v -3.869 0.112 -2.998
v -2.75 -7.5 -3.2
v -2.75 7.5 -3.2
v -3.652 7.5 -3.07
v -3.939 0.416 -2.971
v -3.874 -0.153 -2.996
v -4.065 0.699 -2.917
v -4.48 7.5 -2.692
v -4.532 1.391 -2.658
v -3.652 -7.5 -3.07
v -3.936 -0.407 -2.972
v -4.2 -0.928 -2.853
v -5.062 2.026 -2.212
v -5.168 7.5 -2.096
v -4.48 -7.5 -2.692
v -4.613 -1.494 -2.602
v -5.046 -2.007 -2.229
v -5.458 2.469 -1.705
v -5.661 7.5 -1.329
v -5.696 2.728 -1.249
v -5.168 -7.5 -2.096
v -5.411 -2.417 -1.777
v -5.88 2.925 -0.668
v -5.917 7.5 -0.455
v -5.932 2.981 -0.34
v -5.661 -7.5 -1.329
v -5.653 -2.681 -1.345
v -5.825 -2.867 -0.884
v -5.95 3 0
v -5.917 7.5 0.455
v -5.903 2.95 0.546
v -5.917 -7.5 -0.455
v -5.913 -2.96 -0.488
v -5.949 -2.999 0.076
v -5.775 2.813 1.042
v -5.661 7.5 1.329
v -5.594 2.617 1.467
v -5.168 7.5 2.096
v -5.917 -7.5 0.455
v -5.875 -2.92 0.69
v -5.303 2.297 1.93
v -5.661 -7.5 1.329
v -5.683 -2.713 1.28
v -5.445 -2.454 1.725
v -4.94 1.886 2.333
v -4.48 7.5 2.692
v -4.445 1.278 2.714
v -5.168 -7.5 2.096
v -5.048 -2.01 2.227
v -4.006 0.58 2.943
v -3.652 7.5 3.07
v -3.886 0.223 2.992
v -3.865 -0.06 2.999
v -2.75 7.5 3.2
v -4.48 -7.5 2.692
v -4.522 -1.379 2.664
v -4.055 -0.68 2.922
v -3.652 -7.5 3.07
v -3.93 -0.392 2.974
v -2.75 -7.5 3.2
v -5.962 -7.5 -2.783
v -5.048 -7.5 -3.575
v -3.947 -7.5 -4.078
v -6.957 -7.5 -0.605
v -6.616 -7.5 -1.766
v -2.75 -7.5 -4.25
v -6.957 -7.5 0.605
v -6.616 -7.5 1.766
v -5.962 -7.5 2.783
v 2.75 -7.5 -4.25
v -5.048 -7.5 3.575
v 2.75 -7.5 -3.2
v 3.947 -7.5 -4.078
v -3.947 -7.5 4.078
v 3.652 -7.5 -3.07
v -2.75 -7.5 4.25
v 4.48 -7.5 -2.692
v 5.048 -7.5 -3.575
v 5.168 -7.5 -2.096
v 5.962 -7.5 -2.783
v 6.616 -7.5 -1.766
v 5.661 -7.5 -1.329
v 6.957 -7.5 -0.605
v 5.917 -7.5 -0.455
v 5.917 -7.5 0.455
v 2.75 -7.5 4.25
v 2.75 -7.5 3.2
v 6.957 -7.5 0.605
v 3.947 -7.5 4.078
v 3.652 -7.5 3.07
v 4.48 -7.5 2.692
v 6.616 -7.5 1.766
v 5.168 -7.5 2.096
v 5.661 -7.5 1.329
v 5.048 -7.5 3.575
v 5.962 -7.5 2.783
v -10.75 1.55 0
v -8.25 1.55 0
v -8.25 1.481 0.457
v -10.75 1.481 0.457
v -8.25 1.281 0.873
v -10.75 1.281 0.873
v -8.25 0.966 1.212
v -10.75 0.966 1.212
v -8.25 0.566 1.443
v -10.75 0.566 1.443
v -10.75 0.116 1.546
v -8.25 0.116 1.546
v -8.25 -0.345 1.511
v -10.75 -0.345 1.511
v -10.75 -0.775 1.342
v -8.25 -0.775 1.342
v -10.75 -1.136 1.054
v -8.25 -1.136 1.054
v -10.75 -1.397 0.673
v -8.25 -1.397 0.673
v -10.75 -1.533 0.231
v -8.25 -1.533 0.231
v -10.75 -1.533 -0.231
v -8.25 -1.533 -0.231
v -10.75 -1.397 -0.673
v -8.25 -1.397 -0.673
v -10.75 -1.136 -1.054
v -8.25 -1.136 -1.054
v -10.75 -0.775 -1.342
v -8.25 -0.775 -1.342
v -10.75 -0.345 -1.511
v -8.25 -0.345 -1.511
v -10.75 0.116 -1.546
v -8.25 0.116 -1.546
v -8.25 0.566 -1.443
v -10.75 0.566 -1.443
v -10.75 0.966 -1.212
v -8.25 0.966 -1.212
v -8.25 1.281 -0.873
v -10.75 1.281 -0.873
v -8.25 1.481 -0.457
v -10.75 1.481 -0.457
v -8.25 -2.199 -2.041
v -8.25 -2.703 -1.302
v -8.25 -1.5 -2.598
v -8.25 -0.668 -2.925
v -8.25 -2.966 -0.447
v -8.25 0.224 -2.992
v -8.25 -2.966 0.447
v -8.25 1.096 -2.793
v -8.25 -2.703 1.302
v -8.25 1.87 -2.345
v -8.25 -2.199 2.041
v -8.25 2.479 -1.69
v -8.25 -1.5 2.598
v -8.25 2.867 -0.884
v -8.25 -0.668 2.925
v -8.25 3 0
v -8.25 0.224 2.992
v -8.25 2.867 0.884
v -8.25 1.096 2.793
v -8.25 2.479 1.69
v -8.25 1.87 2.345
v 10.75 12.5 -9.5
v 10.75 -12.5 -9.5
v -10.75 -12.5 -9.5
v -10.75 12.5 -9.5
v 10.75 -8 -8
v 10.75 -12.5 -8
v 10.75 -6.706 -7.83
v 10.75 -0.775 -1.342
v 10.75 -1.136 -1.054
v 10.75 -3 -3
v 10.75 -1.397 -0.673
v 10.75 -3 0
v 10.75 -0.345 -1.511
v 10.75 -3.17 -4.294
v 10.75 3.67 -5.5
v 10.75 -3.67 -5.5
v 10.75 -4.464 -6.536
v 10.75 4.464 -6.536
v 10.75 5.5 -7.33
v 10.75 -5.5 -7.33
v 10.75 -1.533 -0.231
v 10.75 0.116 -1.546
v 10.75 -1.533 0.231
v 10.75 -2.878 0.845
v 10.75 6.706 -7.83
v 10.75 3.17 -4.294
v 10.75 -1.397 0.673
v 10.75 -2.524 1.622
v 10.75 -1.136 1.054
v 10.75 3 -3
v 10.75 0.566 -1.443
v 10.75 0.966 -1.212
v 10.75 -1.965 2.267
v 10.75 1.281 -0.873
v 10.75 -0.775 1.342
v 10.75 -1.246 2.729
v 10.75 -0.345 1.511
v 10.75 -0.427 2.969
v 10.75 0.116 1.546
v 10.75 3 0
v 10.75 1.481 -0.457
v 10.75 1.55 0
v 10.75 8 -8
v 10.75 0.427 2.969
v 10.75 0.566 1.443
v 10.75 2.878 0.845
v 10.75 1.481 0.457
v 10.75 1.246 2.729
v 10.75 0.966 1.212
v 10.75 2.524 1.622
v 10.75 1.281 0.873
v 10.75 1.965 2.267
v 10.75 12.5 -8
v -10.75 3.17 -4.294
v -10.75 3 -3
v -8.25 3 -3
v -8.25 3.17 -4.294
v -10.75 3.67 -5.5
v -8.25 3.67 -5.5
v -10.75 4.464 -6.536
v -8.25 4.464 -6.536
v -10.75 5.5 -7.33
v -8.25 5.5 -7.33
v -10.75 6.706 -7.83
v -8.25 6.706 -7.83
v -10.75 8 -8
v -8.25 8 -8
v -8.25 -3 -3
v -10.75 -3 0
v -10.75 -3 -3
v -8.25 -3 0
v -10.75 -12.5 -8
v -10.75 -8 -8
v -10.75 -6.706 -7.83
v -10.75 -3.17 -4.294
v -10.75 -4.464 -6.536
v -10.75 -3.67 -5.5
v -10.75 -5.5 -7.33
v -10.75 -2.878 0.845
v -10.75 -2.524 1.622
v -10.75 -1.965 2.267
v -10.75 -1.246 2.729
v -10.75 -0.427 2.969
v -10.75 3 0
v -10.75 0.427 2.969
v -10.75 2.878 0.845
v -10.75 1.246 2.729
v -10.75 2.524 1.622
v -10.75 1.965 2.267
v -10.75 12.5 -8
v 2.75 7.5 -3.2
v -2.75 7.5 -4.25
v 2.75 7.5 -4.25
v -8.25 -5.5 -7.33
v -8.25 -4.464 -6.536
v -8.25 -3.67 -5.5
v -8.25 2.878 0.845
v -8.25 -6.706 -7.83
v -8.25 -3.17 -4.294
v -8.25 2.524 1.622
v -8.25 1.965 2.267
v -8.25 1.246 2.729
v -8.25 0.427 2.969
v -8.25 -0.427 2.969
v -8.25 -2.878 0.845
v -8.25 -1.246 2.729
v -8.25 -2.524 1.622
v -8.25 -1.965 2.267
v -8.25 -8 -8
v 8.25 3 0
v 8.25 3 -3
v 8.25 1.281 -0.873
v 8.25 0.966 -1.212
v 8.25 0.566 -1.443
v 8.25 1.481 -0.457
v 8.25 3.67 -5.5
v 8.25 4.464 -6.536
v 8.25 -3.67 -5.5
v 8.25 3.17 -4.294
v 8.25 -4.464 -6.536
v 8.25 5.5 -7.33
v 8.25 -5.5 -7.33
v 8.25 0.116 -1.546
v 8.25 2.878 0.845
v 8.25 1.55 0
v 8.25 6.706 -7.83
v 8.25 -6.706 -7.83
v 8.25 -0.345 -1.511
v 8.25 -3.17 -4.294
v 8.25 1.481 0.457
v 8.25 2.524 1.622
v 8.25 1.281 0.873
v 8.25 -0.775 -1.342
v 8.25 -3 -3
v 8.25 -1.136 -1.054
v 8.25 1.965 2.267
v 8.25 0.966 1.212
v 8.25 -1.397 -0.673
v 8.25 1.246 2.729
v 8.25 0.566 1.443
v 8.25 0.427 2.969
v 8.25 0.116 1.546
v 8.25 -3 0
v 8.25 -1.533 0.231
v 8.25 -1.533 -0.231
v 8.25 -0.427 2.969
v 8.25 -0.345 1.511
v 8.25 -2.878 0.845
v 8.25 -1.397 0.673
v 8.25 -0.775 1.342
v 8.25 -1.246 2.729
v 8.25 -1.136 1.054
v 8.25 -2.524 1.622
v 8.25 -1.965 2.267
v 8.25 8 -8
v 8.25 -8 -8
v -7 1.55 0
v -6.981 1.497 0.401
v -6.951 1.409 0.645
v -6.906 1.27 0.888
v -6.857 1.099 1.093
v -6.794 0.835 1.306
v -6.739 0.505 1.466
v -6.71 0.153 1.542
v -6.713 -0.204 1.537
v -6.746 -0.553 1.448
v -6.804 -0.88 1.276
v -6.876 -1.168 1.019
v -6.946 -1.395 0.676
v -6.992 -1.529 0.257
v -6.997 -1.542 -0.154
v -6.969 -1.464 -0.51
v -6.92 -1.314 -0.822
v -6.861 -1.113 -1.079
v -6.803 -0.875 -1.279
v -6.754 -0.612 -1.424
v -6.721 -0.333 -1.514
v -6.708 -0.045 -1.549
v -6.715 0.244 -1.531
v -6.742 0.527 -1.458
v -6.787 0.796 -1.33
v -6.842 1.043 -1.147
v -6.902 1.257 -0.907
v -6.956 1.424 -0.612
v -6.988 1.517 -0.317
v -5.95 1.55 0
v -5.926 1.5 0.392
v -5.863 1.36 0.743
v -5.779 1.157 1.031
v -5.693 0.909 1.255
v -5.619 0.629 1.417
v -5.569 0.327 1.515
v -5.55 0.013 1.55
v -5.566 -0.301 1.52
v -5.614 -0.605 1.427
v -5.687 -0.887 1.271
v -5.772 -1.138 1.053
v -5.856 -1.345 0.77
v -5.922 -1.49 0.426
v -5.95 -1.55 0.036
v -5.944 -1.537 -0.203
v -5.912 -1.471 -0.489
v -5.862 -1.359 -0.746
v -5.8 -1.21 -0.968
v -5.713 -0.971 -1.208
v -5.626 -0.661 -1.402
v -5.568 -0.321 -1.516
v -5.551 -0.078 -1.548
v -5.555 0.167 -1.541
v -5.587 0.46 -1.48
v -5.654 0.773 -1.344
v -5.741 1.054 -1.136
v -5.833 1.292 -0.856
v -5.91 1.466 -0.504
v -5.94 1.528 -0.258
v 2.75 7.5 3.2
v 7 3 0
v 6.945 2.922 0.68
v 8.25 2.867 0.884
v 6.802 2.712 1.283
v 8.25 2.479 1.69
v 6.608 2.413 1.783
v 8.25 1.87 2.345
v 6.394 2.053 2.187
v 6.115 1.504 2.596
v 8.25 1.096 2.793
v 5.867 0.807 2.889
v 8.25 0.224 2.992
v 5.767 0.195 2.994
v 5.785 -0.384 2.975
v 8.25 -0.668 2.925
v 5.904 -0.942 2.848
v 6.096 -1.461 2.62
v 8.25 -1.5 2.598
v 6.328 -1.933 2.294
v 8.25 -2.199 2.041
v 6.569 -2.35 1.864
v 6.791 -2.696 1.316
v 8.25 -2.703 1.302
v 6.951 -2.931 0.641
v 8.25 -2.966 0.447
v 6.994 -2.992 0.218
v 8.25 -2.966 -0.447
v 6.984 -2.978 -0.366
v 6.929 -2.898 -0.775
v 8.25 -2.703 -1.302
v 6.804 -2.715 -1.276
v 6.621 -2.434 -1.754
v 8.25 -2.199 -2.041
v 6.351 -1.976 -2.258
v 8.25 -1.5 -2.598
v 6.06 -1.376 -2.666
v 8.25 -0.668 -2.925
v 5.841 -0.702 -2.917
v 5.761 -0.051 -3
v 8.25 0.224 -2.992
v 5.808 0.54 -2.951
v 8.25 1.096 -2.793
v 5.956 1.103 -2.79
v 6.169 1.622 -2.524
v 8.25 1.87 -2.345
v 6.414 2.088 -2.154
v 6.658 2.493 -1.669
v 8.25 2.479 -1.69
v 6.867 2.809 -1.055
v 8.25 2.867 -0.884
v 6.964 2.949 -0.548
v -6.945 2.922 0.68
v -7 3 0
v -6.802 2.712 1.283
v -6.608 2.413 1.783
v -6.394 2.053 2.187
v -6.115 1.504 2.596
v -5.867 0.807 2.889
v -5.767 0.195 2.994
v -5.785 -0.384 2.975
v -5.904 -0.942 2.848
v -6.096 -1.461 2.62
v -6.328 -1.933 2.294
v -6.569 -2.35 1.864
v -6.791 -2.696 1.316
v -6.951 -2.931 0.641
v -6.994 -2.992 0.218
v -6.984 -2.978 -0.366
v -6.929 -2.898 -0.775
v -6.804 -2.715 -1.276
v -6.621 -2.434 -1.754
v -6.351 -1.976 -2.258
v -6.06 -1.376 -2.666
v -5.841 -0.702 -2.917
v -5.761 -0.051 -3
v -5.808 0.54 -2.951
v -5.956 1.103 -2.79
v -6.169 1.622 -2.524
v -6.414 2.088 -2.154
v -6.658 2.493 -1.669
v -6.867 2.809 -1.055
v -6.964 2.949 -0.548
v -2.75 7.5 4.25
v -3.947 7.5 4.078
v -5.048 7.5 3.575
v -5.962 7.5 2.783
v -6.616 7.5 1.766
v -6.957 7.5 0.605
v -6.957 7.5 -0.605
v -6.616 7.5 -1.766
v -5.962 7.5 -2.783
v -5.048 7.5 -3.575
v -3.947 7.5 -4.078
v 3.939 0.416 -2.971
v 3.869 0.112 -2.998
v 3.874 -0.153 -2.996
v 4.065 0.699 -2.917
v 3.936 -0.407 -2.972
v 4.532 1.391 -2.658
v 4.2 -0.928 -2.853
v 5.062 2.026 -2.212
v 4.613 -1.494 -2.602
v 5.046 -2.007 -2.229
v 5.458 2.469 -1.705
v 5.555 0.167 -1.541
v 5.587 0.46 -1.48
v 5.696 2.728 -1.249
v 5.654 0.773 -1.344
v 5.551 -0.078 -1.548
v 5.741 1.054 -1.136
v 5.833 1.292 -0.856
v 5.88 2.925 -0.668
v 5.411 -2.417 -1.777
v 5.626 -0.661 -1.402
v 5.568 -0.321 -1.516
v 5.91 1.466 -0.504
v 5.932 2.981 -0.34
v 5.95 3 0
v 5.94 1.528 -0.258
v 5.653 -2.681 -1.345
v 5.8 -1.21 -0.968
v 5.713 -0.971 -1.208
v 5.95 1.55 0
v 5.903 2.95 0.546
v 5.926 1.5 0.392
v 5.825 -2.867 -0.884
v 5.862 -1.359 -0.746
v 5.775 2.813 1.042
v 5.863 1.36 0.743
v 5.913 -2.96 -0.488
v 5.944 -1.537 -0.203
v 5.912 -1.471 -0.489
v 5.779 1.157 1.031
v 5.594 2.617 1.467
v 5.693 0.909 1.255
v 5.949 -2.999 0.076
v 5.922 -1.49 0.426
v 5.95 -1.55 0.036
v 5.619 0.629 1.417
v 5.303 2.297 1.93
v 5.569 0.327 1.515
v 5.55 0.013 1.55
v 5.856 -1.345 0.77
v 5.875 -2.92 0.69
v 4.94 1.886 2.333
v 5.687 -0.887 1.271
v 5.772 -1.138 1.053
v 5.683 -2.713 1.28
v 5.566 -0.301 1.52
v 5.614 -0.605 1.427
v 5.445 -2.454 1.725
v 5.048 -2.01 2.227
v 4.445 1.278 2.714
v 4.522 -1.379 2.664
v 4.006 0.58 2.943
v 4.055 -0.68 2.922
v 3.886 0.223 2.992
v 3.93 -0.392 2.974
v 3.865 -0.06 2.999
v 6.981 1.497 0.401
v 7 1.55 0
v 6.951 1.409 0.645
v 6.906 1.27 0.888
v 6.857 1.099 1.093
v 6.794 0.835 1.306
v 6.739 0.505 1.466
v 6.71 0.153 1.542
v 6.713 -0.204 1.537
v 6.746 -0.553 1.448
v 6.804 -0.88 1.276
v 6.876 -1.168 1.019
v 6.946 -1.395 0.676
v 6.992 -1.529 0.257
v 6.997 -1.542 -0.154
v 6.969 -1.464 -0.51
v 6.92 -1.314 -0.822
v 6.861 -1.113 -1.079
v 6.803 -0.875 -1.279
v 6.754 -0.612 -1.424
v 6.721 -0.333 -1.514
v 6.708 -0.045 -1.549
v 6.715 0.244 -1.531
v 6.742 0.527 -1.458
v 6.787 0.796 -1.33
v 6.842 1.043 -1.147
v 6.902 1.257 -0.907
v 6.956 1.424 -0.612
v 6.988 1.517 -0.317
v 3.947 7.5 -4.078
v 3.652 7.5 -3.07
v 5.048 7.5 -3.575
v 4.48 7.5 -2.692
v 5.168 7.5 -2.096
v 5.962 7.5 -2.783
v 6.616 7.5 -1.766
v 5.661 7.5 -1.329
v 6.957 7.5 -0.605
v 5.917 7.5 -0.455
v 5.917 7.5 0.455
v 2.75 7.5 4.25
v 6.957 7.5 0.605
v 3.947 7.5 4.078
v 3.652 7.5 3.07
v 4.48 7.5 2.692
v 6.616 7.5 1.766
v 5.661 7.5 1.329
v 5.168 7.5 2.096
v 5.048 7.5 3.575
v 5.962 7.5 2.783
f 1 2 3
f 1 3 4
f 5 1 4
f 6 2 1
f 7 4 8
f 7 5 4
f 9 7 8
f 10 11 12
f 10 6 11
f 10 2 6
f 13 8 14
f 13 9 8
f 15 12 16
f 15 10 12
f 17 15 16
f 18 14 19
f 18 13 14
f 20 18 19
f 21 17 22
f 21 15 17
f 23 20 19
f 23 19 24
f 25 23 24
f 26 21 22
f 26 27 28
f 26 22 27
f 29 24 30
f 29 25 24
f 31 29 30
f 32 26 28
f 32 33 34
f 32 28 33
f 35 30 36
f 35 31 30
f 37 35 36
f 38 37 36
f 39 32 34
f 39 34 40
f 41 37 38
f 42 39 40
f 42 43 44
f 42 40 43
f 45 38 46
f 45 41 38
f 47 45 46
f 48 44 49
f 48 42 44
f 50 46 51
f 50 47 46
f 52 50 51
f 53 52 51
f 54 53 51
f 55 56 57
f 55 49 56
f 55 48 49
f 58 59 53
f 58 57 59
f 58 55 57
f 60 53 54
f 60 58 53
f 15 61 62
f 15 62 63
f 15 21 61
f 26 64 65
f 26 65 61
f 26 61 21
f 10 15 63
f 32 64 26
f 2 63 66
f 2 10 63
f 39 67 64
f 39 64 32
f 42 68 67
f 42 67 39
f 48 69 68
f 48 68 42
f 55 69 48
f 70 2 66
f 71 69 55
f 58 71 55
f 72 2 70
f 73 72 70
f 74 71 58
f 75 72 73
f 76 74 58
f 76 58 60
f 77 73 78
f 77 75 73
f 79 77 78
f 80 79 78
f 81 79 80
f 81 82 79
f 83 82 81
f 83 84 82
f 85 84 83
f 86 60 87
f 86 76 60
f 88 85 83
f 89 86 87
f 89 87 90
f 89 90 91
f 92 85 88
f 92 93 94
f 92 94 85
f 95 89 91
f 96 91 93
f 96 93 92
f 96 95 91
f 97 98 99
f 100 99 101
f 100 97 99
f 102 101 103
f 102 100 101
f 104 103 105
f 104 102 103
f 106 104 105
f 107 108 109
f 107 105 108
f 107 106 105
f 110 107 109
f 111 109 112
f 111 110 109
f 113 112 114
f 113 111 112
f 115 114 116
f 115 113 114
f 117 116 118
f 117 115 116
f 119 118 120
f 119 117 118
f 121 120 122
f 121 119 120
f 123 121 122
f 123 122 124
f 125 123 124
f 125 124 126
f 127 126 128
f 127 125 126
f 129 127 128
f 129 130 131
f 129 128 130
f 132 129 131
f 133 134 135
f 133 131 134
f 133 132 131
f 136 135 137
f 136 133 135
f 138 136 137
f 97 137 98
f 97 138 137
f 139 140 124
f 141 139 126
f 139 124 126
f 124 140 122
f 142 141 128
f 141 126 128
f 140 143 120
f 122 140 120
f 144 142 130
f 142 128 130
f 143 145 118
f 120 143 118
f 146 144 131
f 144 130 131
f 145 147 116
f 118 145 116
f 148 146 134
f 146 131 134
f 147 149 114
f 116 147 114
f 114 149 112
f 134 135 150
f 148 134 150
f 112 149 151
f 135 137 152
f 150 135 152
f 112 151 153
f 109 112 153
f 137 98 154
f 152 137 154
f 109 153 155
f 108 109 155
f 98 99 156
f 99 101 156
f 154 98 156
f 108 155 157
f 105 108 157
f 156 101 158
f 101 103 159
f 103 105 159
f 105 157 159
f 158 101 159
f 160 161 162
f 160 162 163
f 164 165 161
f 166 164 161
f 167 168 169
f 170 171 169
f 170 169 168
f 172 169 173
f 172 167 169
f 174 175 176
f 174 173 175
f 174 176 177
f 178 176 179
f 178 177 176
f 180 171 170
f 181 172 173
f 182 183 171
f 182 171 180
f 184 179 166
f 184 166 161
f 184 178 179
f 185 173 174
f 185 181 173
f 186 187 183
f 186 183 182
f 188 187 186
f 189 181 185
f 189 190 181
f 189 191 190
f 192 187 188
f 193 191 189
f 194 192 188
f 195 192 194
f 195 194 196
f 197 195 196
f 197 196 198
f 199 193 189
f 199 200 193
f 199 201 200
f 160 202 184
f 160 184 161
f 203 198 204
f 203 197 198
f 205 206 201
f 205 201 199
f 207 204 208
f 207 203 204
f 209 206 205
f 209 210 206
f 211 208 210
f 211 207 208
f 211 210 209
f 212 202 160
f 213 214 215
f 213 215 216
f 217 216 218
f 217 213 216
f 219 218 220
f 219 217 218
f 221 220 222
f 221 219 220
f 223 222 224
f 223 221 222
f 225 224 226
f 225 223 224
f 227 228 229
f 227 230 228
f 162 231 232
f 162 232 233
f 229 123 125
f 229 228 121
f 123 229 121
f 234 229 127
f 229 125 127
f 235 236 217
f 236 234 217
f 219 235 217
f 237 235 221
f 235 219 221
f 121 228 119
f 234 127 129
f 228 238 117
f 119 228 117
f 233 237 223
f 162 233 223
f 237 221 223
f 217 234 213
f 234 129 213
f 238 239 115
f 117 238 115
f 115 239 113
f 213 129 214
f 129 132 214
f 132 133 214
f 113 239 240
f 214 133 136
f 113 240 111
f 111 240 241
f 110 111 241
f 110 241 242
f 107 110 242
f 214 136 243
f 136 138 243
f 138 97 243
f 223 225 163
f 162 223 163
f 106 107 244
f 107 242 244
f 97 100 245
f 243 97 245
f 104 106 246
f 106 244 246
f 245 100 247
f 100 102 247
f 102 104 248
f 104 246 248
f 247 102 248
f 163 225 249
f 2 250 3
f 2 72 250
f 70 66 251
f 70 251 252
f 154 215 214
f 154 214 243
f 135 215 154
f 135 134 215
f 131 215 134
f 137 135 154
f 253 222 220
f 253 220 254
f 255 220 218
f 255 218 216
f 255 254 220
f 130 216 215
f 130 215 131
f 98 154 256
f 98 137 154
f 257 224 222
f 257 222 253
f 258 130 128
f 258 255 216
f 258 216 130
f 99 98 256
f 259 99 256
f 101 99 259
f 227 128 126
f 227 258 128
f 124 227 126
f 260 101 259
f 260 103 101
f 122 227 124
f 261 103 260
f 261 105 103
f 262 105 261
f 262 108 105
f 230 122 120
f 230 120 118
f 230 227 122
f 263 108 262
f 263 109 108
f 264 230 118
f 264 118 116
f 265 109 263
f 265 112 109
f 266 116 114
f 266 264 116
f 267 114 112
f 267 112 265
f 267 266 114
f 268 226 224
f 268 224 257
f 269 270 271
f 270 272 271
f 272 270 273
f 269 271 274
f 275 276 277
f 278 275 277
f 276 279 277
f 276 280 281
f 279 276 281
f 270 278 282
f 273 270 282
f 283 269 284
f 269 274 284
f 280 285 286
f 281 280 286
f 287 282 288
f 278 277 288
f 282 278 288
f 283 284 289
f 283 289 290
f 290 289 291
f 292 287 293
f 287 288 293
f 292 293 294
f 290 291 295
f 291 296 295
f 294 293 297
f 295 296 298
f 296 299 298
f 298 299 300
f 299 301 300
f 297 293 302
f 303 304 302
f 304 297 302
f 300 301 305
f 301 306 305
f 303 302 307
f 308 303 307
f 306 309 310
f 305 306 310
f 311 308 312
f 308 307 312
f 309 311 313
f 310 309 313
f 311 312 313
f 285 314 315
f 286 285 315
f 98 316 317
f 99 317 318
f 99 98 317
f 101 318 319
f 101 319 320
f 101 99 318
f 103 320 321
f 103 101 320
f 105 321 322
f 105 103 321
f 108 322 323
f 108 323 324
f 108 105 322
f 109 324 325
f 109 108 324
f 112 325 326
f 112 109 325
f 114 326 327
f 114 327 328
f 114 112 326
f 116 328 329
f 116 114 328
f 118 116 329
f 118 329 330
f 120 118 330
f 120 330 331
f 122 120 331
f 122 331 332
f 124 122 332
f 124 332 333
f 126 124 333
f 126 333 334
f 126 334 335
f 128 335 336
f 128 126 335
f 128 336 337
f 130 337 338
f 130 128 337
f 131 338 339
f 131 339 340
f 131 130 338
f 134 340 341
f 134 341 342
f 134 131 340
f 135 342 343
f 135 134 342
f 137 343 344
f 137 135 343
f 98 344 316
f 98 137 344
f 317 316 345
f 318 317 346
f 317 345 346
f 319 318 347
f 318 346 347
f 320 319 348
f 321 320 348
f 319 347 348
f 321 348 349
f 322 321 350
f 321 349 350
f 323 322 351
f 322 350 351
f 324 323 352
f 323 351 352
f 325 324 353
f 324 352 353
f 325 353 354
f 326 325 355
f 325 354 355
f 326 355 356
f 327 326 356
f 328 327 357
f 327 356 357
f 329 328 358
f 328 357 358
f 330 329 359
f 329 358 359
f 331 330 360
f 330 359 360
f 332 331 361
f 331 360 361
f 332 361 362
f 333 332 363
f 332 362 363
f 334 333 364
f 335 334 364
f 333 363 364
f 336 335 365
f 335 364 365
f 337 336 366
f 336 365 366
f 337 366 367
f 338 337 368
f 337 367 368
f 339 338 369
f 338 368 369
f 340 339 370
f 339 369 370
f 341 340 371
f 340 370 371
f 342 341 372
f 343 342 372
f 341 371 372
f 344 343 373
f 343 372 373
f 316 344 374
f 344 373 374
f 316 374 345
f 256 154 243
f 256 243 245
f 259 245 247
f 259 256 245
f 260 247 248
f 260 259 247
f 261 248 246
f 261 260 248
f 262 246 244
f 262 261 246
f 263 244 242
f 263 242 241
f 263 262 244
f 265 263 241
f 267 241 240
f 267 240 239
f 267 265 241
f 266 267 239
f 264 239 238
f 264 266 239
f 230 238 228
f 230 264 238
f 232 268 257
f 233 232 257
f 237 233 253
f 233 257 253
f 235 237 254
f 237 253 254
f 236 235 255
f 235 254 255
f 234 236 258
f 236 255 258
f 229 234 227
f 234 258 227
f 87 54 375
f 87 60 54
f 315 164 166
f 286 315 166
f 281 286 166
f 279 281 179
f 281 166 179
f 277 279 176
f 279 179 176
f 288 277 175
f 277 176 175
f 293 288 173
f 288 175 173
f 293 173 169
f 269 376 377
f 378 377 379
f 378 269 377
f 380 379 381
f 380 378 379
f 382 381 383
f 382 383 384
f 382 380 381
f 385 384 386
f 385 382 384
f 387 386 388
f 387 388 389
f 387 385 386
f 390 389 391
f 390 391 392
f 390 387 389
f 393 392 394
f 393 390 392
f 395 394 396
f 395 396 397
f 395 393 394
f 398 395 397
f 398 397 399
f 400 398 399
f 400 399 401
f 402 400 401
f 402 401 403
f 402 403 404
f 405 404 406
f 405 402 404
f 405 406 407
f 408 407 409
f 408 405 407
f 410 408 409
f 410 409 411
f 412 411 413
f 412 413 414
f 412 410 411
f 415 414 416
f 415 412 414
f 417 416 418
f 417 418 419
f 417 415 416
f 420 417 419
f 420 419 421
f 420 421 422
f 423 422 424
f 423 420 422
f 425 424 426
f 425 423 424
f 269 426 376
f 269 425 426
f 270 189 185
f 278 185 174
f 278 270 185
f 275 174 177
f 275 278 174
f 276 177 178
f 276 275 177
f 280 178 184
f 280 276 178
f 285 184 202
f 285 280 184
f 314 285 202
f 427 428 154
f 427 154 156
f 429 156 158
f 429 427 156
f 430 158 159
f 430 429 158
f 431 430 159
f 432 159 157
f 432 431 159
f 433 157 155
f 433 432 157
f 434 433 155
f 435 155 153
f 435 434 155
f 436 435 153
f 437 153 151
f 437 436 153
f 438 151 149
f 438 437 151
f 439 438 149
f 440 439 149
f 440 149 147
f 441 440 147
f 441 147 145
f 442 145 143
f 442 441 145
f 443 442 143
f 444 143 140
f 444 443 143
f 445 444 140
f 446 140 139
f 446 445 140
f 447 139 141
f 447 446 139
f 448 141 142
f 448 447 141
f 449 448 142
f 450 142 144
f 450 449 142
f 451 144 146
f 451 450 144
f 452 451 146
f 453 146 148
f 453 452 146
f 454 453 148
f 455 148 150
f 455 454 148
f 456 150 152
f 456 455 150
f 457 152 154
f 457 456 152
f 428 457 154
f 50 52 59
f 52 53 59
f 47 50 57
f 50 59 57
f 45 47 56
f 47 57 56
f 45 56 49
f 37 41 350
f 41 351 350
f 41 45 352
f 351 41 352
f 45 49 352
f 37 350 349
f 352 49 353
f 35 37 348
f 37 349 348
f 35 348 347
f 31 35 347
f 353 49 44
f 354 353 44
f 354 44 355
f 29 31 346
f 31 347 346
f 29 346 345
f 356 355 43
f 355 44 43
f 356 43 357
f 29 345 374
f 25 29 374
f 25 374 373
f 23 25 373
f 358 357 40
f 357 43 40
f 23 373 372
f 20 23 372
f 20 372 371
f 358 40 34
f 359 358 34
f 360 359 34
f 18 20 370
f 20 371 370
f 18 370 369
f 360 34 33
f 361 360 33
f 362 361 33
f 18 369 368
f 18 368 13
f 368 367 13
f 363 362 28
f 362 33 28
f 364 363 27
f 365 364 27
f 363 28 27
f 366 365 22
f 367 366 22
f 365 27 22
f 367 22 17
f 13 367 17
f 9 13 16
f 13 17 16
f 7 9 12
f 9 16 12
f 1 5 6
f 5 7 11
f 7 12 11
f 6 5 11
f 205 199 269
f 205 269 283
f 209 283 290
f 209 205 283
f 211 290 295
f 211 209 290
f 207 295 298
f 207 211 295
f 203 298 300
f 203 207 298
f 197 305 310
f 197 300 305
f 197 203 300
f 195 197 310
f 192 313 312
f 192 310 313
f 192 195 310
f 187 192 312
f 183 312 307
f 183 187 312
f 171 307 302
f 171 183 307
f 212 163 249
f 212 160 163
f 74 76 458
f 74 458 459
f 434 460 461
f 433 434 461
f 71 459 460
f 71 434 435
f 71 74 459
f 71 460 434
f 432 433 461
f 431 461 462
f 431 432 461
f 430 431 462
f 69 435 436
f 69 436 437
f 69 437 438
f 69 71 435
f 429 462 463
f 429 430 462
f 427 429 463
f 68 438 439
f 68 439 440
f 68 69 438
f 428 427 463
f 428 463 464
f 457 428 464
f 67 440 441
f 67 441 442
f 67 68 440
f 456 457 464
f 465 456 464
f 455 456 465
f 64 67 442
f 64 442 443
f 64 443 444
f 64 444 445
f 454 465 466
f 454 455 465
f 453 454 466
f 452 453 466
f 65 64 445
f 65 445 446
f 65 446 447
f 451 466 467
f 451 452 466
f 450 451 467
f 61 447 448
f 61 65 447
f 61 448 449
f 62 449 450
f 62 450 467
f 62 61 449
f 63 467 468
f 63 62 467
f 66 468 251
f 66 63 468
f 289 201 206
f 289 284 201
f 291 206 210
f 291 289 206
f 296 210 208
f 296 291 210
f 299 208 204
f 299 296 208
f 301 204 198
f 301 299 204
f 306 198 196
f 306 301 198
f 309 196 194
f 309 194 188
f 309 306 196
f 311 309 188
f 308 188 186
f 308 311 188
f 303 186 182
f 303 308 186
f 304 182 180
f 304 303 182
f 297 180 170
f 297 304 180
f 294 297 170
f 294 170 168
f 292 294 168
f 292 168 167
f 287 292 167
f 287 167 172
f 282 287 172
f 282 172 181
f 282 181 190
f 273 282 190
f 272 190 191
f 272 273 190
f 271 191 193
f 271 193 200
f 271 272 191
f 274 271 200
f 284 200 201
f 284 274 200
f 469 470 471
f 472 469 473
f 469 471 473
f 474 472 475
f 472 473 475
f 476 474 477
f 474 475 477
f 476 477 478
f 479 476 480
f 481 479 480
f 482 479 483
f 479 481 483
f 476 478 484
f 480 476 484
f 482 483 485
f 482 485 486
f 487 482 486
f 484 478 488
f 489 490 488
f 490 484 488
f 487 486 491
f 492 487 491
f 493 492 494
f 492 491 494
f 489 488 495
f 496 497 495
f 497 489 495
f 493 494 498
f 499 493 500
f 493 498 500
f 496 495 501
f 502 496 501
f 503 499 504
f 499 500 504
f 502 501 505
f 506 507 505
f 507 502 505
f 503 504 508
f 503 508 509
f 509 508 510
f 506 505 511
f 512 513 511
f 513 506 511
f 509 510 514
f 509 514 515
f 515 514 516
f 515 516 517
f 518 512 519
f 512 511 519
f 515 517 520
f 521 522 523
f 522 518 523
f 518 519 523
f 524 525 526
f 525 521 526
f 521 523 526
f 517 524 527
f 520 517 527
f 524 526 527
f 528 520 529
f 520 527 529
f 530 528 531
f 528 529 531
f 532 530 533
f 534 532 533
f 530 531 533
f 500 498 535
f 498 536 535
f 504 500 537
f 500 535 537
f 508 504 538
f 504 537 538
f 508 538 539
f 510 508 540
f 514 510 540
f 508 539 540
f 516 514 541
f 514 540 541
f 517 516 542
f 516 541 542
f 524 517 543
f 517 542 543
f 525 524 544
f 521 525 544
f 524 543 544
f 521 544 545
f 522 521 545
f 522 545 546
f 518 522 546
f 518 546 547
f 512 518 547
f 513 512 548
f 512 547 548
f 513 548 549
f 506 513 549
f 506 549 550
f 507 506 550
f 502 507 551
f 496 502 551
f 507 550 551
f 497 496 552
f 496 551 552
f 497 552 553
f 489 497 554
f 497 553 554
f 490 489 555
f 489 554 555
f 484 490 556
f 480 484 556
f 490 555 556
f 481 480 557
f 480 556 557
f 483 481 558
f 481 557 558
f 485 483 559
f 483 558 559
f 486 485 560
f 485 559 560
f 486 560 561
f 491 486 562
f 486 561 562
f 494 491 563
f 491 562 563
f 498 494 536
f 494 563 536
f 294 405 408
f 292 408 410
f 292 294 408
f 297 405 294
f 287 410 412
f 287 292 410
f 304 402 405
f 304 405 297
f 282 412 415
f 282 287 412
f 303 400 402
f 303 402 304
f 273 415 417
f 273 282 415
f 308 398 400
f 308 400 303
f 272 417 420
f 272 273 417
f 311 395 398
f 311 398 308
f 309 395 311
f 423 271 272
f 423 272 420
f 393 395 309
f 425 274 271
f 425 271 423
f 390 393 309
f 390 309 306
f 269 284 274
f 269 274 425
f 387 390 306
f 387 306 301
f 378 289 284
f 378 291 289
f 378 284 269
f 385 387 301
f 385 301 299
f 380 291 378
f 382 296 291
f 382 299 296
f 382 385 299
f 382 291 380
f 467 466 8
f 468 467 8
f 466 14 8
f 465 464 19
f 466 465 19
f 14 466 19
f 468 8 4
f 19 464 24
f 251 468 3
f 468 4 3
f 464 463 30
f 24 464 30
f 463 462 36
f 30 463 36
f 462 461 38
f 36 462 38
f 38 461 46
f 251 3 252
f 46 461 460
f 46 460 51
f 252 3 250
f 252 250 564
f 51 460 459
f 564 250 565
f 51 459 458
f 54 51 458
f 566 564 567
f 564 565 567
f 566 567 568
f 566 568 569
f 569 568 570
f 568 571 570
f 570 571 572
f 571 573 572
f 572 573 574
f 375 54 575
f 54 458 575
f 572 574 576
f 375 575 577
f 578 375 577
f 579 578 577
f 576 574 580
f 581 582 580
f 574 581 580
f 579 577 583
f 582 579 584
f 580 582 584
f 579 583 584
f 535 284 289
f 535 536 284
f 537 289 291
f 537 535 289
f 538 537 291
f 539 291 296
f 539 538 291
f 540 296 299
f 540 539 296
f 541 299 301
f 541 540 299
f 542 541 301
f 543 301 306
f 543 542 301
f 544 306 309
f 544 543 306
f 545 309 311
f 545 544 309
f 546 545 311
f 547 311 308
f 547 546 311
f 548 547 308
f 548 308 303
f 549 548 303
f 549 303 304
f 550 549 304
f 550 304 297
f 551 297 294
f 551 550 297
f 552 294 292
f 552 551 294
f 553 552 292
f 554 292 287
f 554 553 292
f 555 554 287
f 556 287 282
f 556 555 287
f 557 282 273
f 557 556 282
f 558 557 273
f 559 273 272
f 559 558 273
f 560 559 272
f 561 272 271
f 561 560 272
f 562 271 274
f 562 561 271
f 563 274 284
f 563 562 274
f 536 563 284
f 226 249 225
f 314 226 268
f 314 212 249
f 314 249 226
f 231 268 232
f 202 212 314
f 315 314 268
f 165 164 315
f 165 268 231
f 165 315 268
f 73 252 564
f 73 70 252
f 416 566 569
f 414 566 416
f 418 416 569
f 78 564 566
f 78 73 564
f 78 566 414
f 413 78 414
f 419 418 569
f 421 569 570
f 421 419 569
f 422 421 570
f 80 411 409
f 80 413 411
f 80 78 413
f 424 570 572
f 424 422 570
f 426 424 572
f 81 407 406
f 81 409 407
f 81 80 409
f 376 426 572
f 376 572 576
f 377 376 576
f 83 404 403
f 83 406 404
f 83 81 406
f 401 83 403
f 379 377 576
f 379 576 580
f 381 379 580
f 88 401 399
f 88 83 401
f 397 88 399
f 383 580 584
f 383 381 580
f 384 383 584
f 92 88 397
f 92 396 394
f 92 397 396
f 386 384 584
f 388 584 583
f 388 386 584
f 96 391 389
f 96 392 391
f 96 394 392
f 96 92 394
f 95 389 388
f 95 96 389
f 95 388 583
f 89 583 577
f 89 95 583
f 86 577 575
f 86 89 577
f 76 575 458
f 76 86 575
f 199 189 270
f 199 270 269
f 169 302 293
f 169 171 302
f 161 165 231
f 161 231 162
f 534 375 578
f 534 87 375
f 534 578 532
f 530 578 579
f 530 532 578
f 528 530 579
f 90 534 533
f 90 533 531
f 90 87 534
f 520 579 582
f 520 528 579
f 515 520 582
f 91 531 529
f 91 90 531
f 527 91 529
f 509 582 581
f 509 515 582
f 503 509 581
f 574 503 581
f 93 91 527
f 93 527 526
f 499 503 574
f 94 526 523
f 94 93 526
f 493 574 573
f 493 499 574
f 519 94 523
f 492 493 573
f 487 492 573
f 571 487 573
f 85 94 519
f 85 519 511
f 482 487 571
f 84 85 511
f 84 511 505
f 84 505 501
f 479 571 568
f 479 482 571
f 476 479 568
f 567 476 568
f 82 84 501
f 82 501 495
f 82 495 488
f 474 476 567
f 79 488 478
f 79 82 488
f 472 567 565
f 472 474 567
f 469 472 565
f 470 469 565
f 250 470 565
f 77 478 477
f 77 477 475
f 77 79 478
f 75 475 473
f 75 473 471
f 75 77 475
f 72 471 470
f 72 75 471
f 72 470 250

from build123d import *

# Parameters (mm, degrees)
F2_DEPTH       = 7.5
F1_R           = 3
F1_R_2         = 1.55
F3_DEPTH       = 8.25
F4_DEPTH       = 8.25
F5_DEPTH       = 7.5
F6_R           = 1.55
F7_DEPTH       = 10.75
F8_R           = 5
F9_W           = 16.5
F9_H           = 16
F10_DEPTH      = 12.501
F10_DEPTH_BACK = 12.501


with BuildPart() as f2:
    # F0 (on Front) → F2 (new body, symmetric)
    with BuildSketch(Plane.XZ):
        with BuildLine():
            Line((2.75, 4.25), (-2.75, 4.25))
            ThreePointArc((-2.75, 4.25), (-7, 0), (-2.75, -4.25))
            Line((-2.75, -4.25), (2.75, -4.25))
            ThreePointArc((2.75, -4.25), (7, 0), (2.75, 4.25))
        make_face()
        with BuildLine():
            ThreePointArc((-2.75, -3.2), (-5.95, 0), (-2.75, 3.2))
            Line((-2.75, 3.2), (2.75, 3.2))
            ThreePointArc((2.75, 3.2), (5.95, 0), (2.75, -3.2))
            Line((2.75, -3.2), (-2.75, -3.2))
        make_face(mode=Mode.SUBTRACT)
    extrude(amount=F2_DEPTH, both=True)

    # F1 (on Right) → F3 (join, symmetric)
    with BuildSketch(Plane.YZ):
        Circle(F1_R)
        Circle(F1_R_2, mode=Mode.SUBTRACT)
    extrude(amount=F3_DEPTH, both=True)

    # F1 (on Right) → F4 (cut, symmetric)
    with BuildSketch(Plane.YZ):
        Circle(F1_R_2)
    extrude(amount=F4_DEPTH, both=True, mode=Mode.SUBTRACT)

    # F0 (on Front) → F5 (cut, symmetric)
    with BuildSketch(Plane.XZ):
        with BuildLine():
            Line((2.75, 3.2), (-2.75, 3.2))
            ThreePointArc((-2.75, 3.2), (-5.95, 0), (-2.75, -3.2))
            Line((-2.75, -3.2), (2.75, -3.2))
            ThreePointArc((2.75, -3.2), (5.95, 0), (2.75, 3.2))
        make_face()
    extrude(amount=F5_DEPTH, both=True, mode=Mode.SUBTRACT)


with BuildPart() as f7:
    # F6 (on Right) → F7 (new body, symmetric)
    with BuildSketch(Plane.YZ):
        with BuildLine():
            ThreePointArc((3, 0), (0, 3), (-3, 0))
            Line((-3, 0), (-3, -8))
            Line((-3, -8), (-12.5, -8))
            Line((-12.5, -8), (-12.5, -9.5))
            Line((-12.5, -9.5), (12.5, -9.5))
            Line((12.5, -9.5), (12.5, -8))
            Line((12.5, -8), (3, -8))
            Line((3, -8), (3, 0))
        make_face()
        Circle(F6_R, mode=Mode.SUBTRACT)
    extrude(amount=F7_DEPTH, both=True)

    # F8
    f8_edges = [f7.edges().sort_by_distance(p)[0] for p in [
        (0, 3, -8),
        (0, -3, -8),
    ]]
    fillet(f8_edges, radius=F8_R)

    # F9 (on Front) → F10 (cut, two sides)
    with BuildSketch(Plane.XZ) as f10_sk:
        Rectangle(F9_W, F9_H)
    extrude(amount=F10_DEPTH, mode=Mode.SUBTRACT)
    extrude(f10_sk.sketch, amount=-F10_DEPTH_BACK, mode=Mode.SUBTRACT)


solid = Compound([f2.part, f7.part])
